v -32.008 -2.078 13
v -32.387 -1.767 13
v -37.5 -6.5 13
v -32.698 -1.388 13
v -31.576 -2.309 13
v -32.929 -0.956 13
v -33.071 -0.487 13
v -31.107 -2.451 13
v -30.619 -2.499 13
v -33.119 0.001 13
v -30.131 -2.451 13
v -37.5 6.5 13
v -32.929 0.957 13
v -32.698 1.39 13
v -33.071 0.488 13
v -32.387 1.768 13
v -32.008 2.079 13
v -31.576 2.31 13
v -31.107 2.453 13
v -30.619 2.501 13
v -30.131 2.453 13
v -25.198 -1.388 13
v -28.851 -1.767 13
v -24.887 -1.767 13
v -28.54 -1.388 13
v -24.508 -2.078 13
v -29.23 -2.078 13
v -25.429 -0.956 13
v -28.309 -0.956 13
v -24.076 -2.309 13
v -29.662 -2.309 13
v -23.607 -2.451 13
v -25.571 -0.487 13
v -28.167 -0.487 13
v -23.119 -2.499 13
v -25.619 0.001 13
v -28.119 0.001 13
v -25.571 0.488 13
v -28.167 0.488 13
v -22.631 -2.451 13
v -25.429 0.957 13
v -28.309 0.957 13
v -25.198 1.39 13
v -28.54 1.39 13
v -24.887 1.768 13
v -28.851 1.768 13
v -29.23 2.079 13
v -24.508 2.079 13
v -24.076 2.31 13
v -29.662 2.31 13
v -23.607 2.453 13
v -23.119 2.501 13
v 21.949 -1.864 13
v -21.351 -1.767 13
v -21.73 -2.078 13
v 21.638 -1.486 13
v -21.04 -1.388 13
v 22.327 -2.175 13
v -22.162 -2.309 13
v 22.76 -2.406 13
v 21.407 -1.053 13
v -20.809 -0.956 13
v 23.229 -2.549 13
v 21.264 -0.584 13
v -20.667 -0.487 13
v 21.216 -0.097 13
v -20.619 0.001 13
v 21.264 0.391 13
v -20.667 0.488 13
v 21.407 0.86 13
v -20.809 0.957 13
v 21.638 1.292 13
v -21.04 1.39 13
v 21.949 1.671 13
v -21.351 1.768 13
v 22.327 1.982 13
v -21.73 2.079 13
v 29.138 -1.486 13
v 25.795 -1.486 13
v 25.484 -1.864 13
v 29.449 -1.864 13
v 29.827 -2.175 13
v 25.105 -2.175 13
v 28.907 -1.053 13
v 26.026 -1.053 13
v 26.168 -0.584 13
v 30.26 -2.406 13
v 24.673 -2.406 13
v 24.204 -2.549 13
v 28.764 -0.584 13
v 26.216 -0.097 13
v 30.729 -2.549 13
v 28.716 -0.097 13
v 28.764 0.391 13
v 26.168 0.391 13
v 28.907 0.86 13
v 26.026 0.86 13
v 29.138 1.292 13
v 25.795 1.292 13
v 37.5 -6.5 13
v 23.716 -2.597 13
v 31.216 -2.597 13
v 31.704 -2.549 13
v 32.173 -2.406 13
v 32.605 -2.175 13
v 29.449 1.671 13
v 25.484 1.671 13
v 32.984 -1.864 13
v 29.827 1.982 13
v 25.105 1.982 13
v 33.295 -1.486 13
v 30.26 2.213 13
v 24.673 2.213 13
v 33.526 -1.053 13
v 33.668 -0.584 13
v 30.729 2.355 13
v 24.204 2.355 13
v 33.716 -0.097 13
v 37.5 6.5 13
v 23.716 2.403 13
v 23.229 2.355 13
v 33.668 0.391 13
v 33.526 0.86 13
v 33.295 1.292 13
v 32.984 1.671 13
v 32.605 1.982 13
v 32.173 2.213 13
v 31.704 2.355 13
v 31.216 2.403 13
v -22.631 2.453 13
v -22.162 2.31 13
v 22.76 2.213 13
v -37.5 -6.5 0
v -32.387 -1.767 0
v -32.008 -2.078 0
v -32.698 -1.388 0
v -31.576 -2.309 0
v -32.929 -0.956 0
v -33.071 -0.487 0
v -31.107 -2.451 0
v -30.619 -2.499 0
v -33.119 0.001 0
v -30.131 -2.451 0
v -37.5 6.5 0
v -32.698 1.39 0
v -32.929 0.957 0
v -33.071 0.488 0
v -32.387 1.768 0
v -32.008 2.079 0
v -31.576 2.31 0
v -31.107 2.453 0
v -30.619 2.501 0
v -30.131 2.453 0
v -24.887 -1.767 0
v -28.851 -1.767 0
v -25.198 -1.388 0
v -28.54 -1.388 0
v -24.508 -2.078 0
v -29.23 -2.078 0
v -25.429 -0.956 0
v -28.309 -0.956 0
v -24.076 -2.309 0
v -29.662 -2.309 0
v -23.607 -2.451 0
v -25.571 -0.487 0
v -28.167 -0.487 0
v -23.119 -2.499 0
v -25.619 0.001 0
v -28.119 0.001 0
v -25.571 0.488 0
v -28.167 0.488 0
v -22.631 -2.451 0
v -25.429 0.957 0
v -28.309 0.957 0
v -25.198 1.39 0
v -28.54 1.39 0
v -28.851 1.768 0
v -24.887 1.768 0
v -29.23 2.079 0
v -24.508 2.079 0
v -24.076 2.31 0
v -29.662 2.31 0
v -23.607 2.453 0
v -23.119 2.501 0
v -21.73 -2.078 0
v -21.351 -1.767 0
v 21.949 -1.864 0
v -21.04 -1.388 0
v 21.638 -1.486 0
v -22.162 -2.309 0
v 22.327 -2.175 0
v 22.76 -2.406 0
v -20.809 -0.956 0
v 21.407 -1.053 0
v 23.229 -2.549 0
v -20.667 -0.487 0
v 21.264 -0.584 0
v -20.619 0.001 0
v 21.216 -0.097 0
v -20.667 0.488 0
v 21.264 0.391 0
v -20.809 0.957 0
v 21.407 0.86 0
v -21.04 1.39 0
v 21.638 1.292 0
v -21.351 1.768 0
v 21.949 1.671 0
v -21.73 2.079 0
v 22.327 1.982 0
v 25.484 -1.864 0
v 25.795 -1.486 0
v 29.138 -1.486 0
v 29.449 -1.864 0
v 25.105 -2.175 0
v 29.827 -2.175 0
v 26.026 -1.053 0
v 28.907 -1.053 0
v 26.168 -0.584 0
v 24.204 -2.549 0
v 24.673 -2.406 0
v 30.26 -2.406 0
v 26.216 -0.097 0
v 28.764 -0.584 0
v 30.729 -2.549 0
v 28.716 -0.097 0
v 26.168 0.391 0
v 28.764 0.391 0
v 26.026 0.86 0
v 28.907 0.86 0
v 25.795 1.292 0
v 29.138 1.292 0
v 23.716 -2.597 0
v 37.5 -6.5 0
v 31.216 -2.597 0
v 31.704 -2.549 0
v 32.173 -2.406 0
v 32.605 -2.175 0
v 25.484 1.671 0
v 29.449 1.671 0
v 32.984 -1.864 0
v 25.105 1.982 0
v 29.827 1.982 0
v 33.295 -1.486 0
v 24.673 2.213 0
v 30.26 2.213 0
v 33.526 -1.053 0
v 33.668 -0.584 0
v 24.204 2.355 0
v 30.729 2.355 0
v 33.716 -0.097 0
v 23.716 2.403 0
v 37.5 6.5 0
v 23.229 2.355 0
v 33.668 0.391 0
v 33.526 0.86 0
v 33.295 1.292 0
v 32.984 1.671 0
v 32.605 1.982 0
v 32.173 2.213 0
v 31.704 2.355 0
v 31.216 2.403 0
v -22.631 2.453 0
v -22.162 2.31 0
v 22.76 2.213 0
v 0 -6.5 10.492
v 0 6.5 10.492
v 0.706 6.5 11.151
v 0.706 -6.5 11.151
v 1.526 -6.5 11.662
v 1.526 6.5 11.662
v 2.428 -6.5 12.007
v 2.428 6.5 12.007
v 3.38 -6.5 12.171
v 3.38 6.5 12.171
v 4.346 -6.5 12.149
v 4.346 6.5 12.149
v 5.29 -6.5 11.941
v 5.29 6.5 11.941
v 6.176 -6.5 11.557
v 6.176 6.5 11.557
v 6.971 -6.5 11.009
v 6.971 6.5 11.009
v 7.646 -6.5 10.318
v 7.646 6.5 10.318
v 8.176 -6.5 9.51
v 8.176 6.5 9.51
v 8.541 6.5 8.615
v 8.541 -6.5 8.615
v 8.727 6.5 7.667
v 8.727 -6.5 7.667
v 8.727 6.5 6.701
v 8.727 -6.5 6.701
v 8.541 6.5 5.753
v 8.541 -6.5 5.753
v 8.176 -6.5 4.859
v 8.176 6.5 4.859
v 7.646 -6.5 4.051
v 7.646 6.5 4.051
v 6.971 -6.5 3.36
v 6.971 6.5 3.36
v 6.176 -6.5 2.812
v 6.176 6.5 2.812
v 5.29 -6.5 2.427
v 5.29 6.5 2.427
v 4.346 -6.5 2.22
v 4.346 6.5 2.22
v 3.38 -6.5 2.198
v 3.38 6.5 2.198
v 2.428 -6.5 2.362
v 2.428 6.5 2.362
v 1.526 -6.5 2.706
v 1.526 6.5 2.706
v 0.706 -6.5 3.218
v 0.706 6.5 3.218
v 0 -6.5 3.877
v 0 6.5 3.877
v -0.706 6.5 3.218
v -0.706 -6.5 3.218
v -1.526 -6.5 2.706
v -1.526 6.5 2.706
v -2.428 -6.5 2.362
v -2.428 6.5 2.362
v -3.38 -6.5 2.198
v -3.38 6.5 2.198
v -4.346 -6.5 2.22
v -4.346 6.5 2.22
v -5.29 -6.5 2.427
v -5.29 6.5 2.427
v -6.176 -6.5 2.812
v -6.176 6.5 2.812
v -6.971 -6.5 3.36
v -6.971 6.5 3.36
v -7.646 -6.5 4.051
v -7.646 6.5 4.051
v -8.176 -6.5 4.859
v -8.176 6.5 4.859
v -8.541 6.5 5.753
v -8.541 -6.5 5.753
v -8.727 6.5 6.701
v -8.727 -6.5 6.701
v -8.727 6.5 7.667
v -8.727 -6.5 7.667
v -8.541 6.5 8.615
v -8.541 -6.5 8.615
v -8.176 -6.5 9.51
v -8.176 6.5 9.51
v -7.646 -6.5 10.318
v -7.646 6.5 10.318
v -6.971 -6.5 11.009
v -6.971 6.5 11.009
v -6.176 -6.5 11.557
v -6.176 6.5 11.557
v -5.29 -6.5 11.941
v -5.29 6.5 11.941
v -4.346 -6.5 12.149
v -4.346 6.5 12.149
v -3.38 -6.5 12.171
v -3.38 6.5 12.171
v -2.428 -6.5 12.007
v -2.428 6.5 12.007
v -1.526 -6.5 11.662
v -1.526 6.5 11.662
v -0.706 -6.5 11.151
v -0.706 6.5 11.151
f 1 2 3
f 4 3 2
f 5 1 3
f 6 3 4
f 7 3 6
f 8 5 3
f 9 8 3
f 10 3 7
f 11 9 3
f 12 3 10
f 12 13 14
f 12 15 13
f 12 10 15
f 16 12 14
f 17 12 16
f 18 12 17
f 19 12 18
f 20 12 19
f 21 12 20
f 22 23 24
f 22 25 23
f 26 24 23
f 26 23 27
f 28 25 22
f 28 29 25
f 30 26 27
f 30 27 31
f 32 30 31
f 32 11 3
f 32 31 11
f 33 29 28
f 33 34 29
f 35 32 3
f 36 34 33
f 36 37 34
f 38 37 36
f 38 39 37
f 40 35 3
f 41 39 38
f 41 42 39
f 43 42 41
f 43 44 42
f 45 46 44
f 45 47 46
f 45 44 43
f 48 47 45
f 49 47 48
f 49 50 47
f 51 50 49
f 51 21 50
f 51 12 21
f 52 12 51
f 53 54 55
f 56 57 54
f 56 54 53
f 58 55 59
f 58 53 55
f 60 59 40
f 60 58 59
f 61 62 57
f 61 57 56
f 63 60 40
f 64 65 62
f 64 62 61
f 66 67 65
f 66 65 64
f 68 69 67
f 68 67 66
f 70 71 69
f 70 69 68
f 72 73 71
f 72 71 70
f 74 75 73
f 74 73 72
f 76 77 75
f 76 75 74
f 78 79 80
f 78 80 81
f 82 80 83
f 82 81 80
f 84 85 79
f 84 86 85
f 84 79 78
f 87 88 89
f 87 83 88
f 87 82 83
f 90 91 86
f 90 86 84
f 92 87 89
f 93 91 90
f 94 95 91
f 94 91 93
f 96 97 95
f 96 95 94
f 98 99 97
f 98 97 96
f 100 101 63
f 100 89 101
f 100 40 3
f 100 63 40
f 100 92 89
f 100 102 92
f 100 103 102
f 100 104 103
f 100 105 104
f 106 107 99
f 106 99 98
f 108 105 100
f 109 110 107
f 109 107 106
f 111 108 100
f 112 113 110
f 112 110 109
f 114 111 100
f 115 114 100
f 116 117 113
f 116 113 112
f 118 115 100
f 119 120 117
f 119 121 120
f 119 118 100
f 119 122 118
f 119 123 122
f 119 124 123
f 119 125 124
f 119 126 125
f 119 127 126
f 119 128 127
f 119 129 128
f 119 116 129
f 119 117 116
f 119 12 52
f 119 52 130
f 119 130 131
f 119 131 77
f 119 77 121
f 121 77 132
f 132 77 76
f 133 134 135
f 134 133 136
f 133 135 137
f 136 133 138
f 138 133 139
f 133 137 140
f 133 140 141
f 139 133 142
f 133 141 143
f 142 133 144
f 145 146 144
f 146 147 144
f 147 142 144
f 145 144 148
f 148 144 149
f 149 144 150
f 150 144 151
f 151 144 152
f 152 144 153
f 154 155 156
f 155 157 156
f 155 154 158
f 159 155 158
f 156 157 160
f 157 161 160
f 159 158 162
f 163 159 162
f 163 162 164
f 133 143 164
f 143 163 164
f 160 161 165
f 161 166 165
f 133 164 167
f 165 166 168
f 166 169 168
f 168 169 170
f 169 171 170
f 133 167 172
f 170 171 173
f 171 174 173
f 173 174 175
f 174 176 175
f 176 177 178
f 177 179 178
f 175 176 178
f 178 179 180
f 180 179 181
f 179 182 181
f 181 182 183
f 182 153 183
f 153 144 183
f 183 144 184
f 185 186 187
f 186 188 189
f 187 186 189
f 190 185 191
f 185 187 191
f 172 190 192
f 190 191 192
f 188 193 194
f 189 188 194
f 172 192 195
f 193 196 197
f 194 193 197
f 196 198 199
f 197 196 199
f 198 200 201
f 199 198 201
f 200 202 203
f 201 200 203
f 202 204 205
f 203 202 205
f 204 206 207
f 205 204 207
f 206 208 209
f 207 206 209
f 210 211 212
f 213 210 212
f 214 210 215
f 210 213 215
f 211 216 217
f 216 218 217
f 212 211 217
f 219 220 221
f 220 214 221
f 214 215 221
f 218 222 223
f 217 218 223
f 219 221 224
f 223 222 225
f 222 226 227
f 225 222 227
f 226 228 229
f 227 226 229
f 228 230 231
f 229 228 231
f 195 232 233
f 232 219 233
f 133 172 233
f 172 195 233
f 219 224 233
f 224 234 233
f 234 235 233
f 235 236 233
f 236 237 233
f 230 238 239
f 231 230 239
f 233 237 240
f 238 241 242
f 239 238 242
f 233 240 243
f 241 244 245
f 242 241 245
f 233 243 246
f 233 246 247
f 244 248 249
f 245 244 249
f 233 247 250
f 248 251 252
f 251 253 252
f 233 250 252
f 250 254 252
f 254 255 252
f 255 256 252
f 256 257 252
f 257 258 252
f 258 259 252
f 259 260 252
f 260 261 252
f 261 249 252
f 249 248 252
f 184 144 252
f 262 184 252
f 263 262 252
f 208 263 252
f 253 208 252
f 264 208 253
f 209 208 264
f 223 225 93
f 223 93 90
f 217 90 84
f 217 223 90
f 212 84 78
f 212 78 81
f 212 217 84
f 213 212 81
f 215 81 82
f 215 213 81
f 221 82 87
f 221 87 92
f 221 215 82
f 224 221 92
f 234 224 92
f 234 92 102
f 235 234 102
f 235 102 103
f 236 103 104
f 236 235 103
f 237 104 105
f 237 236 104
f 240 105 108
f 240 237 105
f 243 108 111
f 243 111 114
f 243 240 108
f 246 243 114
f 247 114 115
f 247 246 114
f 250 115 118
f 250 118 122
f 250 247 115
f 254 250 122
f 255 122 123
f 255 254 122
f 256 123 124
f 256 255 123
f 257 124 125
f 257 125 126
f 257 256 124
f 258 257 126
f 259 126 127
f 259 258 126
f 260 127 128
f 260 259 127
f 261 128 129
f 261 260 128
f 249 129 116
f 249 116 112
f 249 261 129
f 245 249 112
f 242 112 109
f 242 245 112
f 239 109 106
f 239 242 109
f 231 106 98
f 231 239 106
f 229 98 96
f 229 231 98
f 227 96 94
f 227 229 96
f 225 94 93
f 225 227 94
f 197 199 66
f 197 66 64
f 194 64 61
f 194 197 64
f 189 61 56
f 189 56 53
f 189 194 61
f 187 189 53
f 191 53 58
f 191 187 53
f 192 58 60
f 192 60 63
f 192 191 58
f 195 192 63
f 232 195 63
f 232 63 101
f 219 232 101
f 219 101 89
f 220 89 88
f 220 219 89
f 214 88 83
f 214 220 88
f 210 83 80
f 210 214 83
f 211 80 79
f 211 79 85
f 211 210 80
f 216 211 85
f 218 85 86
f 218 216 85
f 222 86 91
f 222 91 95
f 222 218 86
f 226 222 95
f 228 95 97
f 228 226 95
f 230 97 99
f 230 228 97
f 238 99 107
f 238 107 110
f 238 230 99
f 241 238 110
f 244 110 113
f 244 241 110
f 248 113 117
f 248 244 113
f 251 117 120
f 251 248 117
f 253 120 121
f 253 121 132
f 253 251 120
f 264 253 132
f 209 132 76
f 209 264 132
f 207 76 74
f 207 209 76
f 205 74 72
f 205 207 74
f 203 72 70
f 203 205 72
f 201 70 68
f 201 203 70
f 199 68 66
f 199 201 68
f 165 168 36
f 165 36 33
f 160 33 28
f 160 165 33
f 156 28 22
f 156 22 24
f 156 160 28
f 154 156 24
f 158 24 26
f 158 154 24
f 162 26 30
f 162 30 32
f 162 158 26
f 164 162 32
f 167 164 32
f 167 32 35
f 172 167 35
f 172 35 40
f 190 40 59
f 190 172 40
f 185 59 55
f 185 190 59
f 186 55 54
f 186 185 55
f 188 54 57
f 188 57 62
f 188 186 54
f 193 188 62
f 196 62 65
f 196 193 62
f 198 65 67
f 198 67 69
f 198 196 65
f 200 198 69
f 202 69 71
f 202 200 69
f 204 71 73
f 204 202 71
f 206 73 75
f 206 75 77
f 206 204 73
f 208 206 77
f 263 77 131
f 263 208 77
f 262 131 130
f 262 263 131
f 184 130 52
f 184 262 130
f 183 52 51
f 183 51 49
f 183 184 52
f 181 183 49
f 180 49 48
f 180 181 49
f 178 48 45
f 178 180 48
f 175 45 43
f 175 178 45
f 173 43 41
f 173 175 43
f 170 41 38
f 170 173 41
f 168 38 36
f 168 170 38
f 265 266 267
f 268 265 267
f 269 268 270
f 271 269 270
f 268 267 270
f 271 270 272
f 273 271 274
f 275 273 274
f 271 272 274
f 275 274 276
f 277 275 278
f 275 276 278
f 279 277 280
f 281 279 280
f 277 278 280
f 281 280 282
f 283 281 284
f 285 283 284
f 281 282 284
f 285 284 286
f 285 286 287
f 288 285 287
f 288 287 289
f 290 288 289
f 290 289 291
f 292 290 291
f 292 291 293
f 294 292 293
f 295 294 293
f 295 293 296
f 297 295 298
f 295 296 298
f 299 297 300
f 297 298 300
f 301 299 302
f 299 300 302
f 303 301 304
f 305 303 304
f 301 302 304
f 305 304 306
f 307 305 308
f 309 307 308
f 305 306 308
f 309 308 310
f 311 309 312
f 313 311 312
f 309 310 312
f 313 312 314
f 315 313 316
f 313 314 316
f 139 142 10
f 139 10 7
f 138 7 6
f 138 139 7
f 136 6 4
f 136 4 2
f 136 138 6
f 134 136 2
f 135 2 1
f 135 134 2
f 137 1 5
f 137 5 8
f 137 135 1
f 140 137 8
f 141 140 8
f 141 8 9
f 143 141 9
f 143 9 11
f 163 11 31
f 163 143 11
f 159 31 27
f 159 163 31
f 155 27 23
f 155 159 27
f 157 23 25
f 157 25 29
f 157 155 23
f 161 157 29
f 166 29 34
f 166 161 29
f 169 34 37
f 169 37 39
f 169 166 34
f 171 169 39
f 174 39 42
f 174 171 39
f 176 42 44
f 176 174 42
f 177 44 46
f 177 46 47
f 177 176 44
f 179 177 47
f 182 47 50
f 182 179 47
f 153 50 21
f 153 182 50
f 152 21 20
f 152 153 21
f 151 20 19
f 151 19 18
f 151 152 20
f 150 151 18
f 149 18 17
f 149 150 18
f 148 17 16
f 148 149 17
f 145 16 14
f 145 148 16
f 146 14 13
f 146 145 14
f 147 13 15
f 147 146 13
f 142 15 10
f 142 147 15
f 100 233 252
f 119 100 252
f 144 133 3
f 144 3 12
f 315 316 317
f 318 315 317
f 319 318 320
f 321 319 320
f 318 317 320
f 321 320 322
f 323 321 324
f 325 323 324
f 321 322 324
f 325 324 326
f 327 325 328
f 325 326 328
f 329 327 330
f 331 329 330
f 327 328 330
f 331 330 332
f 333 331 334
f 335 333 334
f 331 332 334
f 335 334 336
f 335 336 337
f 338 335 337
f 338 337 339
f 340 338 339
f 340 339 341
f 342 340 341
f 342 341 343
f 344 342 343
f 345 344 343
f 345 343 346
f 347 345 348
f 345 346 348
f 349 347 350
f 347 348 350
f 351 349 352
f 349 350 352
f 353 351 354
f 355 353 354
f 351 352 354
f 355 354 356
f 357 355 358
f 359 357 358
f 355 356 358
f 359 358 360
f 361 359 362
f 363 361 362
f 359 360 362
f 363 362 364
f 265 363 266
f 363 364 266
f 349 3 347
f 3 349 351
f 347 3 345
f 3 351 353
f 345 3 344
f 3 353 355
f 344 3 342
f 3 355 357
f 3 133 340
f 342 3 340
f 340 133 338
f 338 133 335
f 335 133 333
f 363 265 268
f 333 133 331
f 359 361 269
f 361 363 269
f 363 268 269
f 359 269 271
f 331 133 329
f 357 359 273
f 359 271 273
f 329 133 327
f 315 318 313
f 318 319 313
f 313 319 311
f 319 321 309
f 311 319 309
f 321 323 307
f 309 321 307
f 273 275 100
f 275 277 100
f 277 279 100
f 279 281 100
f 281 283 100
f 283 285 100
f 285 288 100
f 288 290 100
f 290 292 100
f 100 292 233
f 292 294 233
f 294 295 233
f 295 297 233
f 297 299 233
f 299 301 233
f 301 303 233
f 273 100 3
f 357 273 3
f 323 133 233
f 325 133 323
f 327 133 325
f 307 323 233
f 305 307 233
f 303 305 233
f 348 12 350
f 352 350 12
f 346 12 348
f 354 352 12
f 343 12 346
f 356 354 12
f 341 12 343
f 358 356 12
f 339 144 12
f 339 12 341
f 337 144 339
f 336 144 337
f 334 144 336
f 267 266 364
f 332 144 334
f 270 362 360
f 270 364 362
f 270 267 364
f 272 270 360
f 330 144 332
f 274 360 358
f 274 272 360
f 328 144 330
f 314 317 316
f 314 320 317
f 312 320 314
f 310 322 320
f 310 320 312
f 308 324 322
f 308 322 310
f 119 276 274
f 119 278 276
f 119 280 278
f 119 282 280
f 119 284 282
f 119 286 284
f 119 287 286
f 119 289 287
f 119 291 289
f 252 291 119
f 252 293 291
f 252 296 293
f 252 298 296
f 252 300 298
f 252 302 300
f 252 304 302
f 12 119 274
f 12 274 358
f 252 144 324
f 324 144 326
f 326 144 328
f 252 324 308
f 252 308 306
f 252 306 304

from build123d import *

# Parameters (mm, degrees)
SKETCH1_W           = 75
SKETCH1_H           = 13
BOSS_EXTRUDE1_DEPTH = 13
SKETCH3_R           = 2.5
CUT_EXTRUDE4_DEPTH  = 13
CUT_EXTRUDE5_DEPTH  = 13


with BuildPart() as part:
    # Sketch1 → Boss-Extrude1 (new body)
    with BuildSketch(Plane.XY):
        Rectangle(SKETCH1_W, SKETCH1_H)
    extrude(amount=BOSS_EXTRUDE1_DEPTH)

    # Sketch3 → Cut-Extrude4 (cut)
    with BuildSketch(Plane.XY):
        with Locations(Location((31.216304174, -0.096660898, 0), (0, 0, 180))):
            Circle(SKETCH3_R)
        with Locations(Location((23.716304174, -0.096660898, 0), (0, 0, 180))):
            Circle(SKETCH3_R)
        with Locations(Location((-23.119138504, 0.000687163, 0), (0, 0, 180))):
            Circle(SKETCH3_R)
        with Locations(Location((-30.619138504, 0.000687163, 0), (0, 0, 180))):
            Circle(SKETCH3_R)
    extrude(amount=CUT_EXTRUDE4_DEPTH, mode=Mode.SUBTRACT)

    # Sketch4 → Cut-Extrude5 (cut)
    with BuildSketch(Plane(origin=(0, 6.5, 0), x_dir=(1, 0, 0), z_dir=(0, 1, 0))):
        with BuildLine():
            ThreePointArc((0, -3.877187484), (-8.75, -7.184376623), (0, -10.491565762))
            ThreePointArc((0, -10.491565762), (8.75, -7.184376623), (0, -3.877187484))
        make_face()
    extrude(amount=-CUT_EXTRUDE5_DEPTH, mode=Mode.SUBTRACT)


solid = part.part
